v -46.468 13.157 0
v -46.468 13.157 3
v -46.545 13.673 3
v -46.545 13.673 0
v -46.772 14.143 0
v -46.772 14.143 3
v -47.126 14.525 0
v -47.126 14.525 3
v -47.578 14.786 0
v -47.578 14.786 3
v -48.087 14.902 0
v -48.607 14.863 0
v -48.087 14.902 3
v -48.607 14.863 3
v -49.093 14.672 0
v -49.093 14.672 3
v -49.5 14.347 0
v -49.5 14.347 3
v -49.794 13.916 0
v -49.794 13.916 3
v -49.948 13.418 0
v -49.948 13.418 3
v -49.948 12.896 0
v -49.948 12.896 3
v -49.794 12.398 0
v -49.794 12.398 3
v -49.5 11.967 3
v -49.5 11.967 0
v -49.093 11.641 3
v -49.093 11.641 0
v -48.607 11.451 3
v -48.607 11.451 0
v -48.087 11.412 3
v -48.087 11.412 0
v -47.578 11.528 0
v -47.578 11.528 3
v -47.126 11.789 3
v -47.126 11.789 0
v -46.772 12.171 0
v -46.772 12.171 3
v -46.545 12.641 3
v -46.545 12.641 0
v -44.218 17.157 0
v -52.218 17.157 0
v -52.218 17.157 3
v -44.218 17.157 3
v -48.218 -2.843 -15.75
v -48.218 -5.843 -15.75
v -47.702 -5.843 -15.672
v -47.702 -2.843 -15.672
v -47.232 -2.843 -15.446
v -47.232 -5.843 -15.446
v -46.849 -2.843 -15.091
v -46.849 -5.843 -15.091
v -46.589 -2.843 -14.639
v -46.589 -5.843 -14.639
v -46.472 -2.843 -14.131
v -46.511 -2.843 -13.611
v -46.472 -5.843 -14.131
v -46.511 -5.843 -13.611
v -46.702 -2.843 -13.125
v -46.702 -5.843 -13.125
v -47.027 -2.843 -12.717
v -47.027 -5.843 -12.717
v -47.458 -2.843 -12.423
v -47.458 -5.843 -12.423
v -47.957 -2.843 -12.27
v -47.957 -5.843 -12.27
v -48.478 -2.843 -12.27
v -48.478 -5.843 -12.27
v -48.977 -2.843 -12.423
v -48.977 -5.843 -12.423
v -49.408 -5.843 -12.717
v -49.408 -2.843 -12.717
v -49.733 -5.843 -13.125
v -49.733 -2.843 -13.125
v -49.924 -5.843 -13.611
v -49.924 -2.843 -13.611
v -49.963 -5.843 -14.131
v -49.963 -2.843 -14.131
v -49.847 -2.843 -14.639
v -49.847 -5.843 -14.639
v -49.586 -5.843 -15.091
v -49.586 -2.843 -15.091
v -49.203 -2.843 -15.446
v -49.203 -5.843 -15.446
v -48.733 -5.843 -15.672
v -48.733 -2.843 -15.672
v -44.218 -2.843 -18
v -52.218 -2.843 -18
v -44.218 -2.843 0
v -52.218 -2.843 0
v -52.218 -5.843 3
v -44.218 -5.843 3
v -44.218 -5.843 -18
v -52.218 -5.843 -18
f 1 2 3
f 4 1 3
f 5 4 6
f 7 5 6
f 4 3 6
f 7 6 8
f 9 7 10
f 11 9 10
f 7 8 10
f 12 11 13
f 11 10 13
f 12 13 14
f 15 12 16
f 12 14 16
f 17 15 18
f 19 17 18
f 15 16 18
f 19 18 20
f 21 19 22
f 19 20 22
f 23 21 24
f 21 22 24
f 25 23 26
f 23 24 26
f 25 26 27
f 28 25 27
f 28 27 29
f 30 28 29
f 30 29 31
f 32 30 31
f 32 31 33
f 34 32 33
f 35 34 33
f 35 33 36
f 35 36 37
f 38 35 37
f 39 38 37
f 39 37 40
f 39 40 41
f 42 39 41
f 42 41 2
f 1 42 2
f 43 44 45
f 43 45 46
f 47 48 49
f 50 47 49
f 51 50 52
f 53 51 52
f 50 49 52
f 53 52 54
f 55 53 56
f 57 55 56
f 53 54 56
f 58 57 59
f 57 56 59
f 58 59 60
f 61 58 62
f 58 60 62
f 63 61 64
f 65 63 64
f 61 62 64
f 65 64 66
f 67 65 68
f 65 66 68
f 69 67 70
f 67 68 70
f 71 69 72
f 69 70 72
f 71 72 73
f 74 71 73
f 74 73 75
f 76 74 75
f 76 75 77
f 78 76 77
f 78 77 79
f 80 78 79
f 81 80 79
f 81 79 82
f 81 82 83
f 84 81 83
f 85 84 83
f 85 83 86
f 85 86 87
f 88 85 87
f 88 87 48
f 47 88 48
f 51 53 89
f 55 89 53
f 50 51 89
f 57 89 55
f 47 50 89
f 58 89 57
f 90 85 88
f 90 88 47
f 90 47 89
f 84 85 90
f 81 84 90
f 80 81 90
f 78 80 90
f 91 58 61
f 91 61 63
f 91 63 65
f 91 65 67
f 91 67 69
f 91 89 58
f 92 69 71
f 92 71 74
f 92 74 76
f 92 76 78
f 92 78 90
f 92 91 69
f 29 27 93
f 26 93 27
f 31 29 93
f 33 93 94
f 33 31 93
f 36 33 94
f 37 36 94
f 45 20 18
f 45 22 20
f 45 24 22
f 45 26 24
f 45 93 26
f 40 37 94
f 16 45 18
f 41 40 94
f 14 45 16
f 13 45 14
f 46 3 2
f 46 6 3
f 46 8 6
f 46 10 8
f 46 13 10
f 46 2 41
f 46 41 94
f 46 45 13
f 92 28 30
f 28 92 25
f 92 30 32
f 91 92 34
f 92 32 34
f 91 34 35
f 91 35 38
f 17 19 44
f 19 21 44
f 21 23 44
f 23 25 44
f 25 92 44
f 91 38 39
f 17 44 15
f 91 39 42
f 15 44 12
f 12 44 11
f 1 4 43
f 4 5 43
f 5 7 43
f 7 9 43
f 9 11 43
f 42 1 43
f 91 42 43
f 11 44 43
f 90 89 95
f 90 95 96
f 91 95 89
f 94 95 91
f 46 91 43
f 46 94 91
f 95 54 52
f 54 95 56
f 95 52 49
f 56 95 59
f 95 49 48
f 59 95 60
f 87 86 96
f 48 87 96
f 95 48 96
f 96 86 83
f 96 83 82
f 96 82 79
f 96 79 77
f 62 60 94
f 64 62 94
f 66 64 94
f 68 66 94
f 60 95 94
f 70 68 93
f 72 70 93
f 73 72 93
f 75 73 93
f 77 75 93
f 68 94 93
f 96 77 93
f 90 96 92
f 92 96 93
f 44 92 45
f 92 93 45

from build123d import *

# Parameters (mm, degrees)
SKETCH1_W           = 8
SKETCH1_H           = 23
BOSS_EXTRUDE1_DEPTH = 3
SKETCH2_W           = 8
SKETCH2_H           = 3
BOSS_EXTRUDE2_DEPTH = 18
SKETCH3_R           = 1.75
CUT_EXTRUDE1_DEPTH  = 8
SKETCH4_R           = 1.75
CUT_EXTRUDE2_DEPTH  = 8


with BuildPart() as part:
    # Sketch1 → Boss-Extrude1 (new body)
    with BuildSketch(Plane.XY):
        with Locations((-48.217529248, 5.656933129)):
            Rectangle(SKETCH1_W, SKETCH1_H)
    extrude(amount=BOSS_EXTRUDE1_DEPTH)

    # Sketch2 → Boss-Extrude2 (add)
    with BuildSketch(Plane(origin=(0, 0, 0), x_dir=(-1, 0, 0), z_dir=(0, 0, -1))):
        with Locations((48.217529248, -4.343066871)):
            Rectangle(SKETCH2_W, SKETCH2_H)
    extrude(amount=BOSS_EXTRUDE2_DEPTH)

    # Sketch3 → Cut-Extrude1 (cut)
    with BuildSketch(Plane(origin=(0, -5.843066871, 0), x_dir=(-1, 0, 0), z_dir=(0, -1, 0))):
        with Locations(Location((48.217529248, 14, 0), (0, 0, 90))):
            Circle(SKETCH3_R)
    extrude(amount=-CUT_EXTRUDE1_DEPTH, mode=Mode.SUBTRACT)

    # Sketch4 → Cut-Extrude2 (cut)
    with BuildSketch(Plane.XY.offset(3)):
        with Locations((-48.217529248, 13.156933129)):
            Circle(SKETCH4_R)
    extrude(amount=-CUT_EXTRUDE2_DEPTH, mode=Mode.SUBTRACT)


solid = part.part
